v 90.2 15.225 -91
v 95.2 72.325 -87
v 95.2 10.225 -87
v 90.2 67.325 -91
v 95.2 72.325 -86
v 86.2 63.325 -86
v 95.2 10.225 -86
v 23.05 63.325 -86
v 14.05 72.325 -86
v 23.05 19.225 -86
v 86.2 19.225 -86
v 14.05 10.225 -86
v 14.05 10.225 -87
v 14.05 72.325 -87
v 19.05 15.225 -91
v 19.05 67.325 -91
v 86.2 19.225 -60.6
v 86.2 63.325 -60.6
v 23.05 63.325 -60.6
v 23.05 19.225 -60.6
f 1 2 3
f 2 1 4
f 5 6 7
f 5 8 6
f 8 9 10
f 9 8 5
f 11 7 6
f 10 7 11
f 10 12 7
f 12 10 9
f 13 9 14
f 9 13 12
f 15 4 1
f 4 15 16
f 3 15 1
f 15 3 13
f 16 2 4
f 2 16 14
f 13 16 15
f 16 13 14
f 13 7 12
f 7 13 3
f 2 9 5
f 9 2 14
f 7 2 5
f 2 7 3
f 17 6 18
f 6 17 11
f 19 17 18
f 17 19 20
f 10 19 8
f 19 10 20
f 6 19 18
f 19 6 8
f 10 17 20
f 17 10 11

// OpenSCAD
inches2mm = 25.4;

battery_height = 2.5*inches2mm;

battery_holder_width = 2.25*inches2mm;
battery_holder_depth = 1.5*inches2mm;
battery_holder_height = 1*inches2mm;
battery_fit_tol = 1;

battery_slider_extra_width = 5;
battery_slider_extra_depth = 5;
battery_slider_extra_height = 5;
battery_slider_gasket_thickness = 1.5;

battery_lip_width = 5;
battery_lip_pitch = 5;

battery_offset = 7;

battery_slider_pitch = 10;
battery_slider_width = 5;

mount_hole_diameter = 16.5;
mount_attachment_width = 1.5*inches2mm;
mount_attachment_height = 2.5*inches2mm;
mount_attachment_depth = 1/8*inches2mm;

bolt_diameter = 4.7;
hex_diameter = 8; // M4 nut
hex_thickness = 3; // M4 nut
//hex_diameter = 9.7; // #8 nut
//hex_thickness = 3.2; // #8 nut

post_diameter = 3/8*inches2mm;
post_hole_diameter = 3;
post_height = 3/8*inches2mm;
post_separation = 2*inches2mm;
post_offset = 1/2*inches2mm;

l_hole_diameter = post_hole_diameter+.7;
l_width = 2.5*inches2mm;
l_depth = 2*inches2mm;
l_height = 3.5*inches2mm;
l_offset = 4;
l_thickness = 5;

cover_height = 4*inches2mm;

holder_width = 3*inches2mm;
holder_depth = 2.5*inches2mm;
holder_height = 2*inches2mm;
thickness = 3;
base_thickness = 6;
lip_width = 3/8*inches2mm;
//lip_width = hex_diameter+1;
lip_pitch = 30;

wire_hole_diameter = 1/4*inches2mm;
power_hole_diameter = 1/4*inches2mm;

fit_tol = 1; // space between cover and holder when holder is inserted, adjust to get desired fit

separation = 10; // space between cover and holder, just for display purposes
battery_separation = 5;
battery_holder_separation = 1.5;
l_separation = 3;

square_off_width = lip_width-.1;
square_off_height = base_thickness;
square_off_z = lip_pitch;
$fs = .25;
$fa = .25;

//cover();
//holder();
//l_mount();
//battery_base();
battery_holder();
//battery_slider();

cover_width = holder_width+2*fit_tol+2*thickness;
cover_depth = holder_depth+2*fit_tol+2*thickness;

base_width = cover_width+2*thickness+2*lip_width;
base_depth = cover_depth+2*thickness+2*lip_width;

full_cover_height = cover_height+thickness;

bolt_height =  2*thickness+separation+battery_separation+2+lip_pitch;
bolt_z = -separation-2*thickness-battery_separation-1;


battery_width = battery_holder_width+2*thickness+2*battery_fit_tol;
battery_depth = battery_holder_depth+2*thickness+2*battery_fit_tol;    
battery_base_height = thickness+battery_height;

module cover() {
  difference() {
    union() {
      hull() {
        cube([base_width, base_depth, base_thickness]);
        translate([lip_width, lip_width, lip_pitch-thickness]) cube([base_width-2*lip_width, base_depth-2*lip_width, thickness]);

      }
      hull() {
          translate([base_width/2, base_depth-lip_width+mount_attachment_depth/2-1, cover_height-mount_attachment_height/2+thickness]) cube([mount_attachment_width, mount_attachment_depth, mount_attachment_height], center=true);
          translate([base_width/2, base_depth+10+mount_attachment_depth/2-1, cover_height-mount_attachment_height/2+thickness]) cylinder(r=mount_hole_diameter/2+thickness, h=mount_attachment_height, center=true);
          
      }
      translate([lip_width, lip_width, 0]) 
        cube([cover_width+2*thickness, cover_depth+2*thickness, cover_height+thickness]);
    }
    
    translate([lip_width+thickness,lip_width+thickness,-1]) 
      cube([cover_width, cover_depth, cover_height+1]); 
    hull() {
      translate([.75*lip_width+thickness,.75*lip_width+thickness,-thickness]) 
        cube([cover_width+.5*lip_width, cover_depth+.5*lip_width, thickness]); 
      translate([lip_width+thickness,lip_width+thickness,lip_pitch-thickness]) 
        cube([cover_width, cover_depth, thickness]);
    }
    bolts_and_hexes();
    wire_hole();
    power_hole();
    translate([base_width/2, base_depth+10+mount_attachment_depth/2-1, cover_height-mount_attachment_height/2]) cylinder(r=mount_hole_diameter/2, h=mount_attachment_height, center=true);
  }
}

module holder() {
difference() {
union() {
  difference() {
    union() {
        translate([0,0,-separation-thickness]) cube([base_width, base_depth, thickness]);
        translate([lip_width+thickness+fit_tol,lip_width+thickness+fit_tol,-separation-1]) 
          cube([cover_width-2*fit_tol, cover_depth-2*fit_tol, holder_height]);
    }
    translate([lip_width+thickness+fit_tol+thickness,lip_width+thickness+fit_tol+thickness,-separation]) 
          cube([cover_width-2*fit_tol-2*thickness, cover_depth-2*fit_tol-2*thickness, holder_height+1]);
    bolts_and_hexes();
    wire_hole();
    power_hole();
  }
  translate([base_width/2-post_separation/2,base_depth/2+post_offset,-separation-1]) cylinder(r=post_diameter/2, h=post_height+1);
    translate([base_width/2+post_separation/2,base_depth/2+post_offset,-separation-1]) cylinder(r=post_diameter/2, h=post_height+1);

}
  l_holes(post_hole_diameter);
}
}

module l_holes(d) {
      translate([base_width/2-post_separation/2,base_depth/2+post_offset,-separation]) cylinder(r=d/2, h=post_height+1+l_separation+l_thickness);
    translate([base_width/2+post_separation/2,base_depth/2+post_offset,-separation]) cylinder(r=d/2, h=post_height+1+l_separation+l_thickness);
}

module l_mount() {
    
    difference() {
      union() {
        translate([base_width/2, base_depth/2-l_offset, -separation+post_height+l_thickness/2+l_separation]) cube([l_width, l_depth, l_thickness], center=true); 
        //translate([
      }
      l_holes(l_hole_diameter);
    }
    
}

module bolts_and_hexes() {
    //bolts
    translate([lip_width/2,lip_width/2,bolt_z]) cylinder(r=bolt_diameter/2, h =bolt_height);
    translate([base_width-lip_width/2,lip_width/2,bolt_z]) cylinder(r=bolt_diameter/2, h = bolt_height);
    translate([base_width-lip_width/2,base_depth-lip_width/2,bolt_z]) cylinder(r=bolt_diameter/2, h = bolt_height);
    translate([lip_width/2,base_depth-lip_width/2,bolt_z]) cylinder(r=bolt_diameter/2, h = bolt_height);
    translate([base_width/2,lip_width/2,bolt_z]) cylinder(r=bolt_diameter/2, h = bolt_height);
    translate([base_width/2,base_depth-lip_width/2,bolt_z]) cylinder(r=bolt_diameter/2, h = bolt_height);
    translate([base_width-lip_width/2,base_depth/2,bolt_z]) cylinder(r=bolt_diameter/2, h = bolt_height);
    translate([lip_width/2,base_depth/2,bolt_z]) cylinder(r=bolt_diameter/2, h = bolt_height);
    
    // square off bolt holes on cover slant
    translate([lip_width/2,lip_width/2,square_off_height+square_off_z/2]) cube([square_off_width, square_off_width,square_off_z], center=true);
    translate([base_width-lip_width/2,lip_width/2,square_off_height+square_off_z/2]) cube([square_off_width,square_off_width,square_off_z], center=true);
    translate([base_width-lip_width/2,base_depth-lip_width/2,square_off_height+square_off_z/2]) cube([square_off_width,square_off_width,square_off_z], center=true);
    translate([lip_width/2,base_depth-lip_width/2,square_off_height+square_off_z/2]) cube([square_off_width,square_off_width,square_off_z], center=true);
    translate([base_width/2,lip_width/2,square_off_height+square_off_z/2]) cube([square_off_width,square_off_width,square_off_z], center=true);
    translate([base_width/2,base_depth-lip_width/2,square_off_height+square_off_z/2]) cube([square_off_width,square_off_width,square_off_z], center=true);
    translate([base_width-lip_width/2,base_depth/2,square_off_height+square_off_z/2]) cube([square_off_width,square_off_width,square_off_z], center=true);
    translate([lip_width/2,base_depth/2,square_off_height+square_off_z/2]) cube([square_off_width,square_off_width,square_off_z], center=true);
    
    // slots for inserted hex nuts
    translate([lip_width/2,lip_width/2,base_thickness-hex_thickness]) cylinder(r=hex_diameter/2, h = hex_thickness+1, $fn=6);
    translate([base_width-lip_width/2,lip_width/2,base_thickness-hex_thickness]) cylinder(r=hex_diameter/2, h = hex_thickness+1, $fn=6);
    translate([base_width-lip_width/2,base_depth-lip_width/2,base_thickness-hex_thickness]) cylinder(r=hex_diameter/2, h = hex_thickness+1, $fn=6);
    translate([lip_width/2,base_depth-lip_width/2,base_thickness-hex_thickness]) cylinder(r=hex_diameter/2, h = hex_thickness+1, $fn=6);
    translate([base_width/2,base_depth-lip_width/2,base_thickness-hex_thickness]) cylinder(r=hex_diameter/2, h = hex_thickness+1, $fn=6);
     translate([base_width/2,lip_width/2,base_thickness-hex_thickness]) cylinder(r=hex_diameter/2, h = hex_thickness+1, $fn=6);
     translate([lip_width/2,base_depth/2,base_thickness-hex_thickness]) cylinder(r=hex_diameter/2, h = hex_thickness+1, $fn=6);
    translate([base_width-lip_width/2,base_depth/2,base_thickness-hex_thickness]) cylinder(r=hex_diameter/2, h = hex_thickness+1, $fn=6);
}

module wire_hole() {
    translate([base_width/2,base_depth-(lip_width+thickness+wire_hole_diameter+fit_tol), -battery_separation-separation-2*thickness-1]) cylinder(r=wire_hole_diameter/2, h=2*thickness+separation+battery_separation+2);
}
module power_hole() {
    translate([base_width/2,base_depth/2, -battery_separation-separation-2*thickness-1]) cylinder(r=power_hole_diameter/2, h=2*thickness+separation+battery_separation+2);
}

module battery_base() {
    difference() {
      translate([0,0,-separation-battery_separation-thickness]) local_battery_base();
      bolts_and_hexes();
      wire_hole();
      power_hole();
    }
}

module local_battery_base() {
  difference() {
    union() {
      translate([base_width/2,base_depth/2-battery_offset,-thickness-battery_height/2]) cube([battery_width+2*thickness, battery_depth+2*thickness, battery_height], center=true);
        
      translate([0,0,-thickness]) cube([base_width, base_depth, thickness]);
      translate([0,-battery_offset, 0]) hull() {
          translate([base_width/2, base_depth/2, -thickness-battery_height-.5+battery_lip_pitch]) cube([battery_width+2*thickness, battery_depth+2*thickness, 1], center=true);
          translate([base_width/2, base_depth/2, -thickness-battery_height+.5]) cube([battery_width+2*battery_lip_width+2*thickness, battery_depth+2*battery_lip_width+2*thickness, 1], center=true);
      }
    }
    
    translate([base_width/2,base_depth/2-battery_offset,-thickness-battery_height/2-1]) cube([battery_width, battery_depth, battery_height+2], center=true);
   translate([0,-battery_offset, 0]) hull() {
          translate([base_width/2, base_depth/2, -thickness-battery_height-.5+battery_holder_height/2]) cube([battery_width, battery_depth, 1], center=true);
          translate([base_width/2, base_depth/2, -thickness-battery_height-.5]) cube([battery_width+battery_fit_tol+1, battery_depth+battery_fit_tol+1, 1], center=true);
      }
  }
}

module battery_holder() {
  translate([0,0,-separation-thickness-battery_separation-battery_base_height-battery_holder_separation]) local_battery_holder();
}

module local_battery_holder() {
    difference() {
    union() {
  translate([0,-battery_offset, 0]) hull() {
    translate([base_width/2, base_depth/2, -.5]) cube([battery_width+2*battery_lip_width+2*thickness, battery_depth+2*battery_lip_width+2*thickness, 1], center=true);
    
    translate([base_width/2, base_depth/2, .5-battery_lip_pitch]) cube([battery_width+2*thickness, battery_depth+2*thickness, 1], center=true);
    
  }
  translate([base_width/2, base_depth/2-battery_offset, battery_holder_height/2]) cube([battery_holder_width+2*thickness, battery_holder_depth+2*thickness, battery_holder_height], center=true);
  
  }
  
  }
}

module battery_slider() {
    translate([base_width/2,base_depth/2-battery_offset,-separation-thickness-battery_separation-battery_base_height-battery_holder_separation/2]) local_battery_slider();
}

slider_width = battery_width+2*thickness+2*battery_lip_width+battery_slider_extra_width;
slider_depth = battery_depth+2*thickness+2*battery_lip_width+battery_slider_extra_height;
slider_height = 2*battery_lip_pitch+battery_slider_gasket_thickness+battery_slider_extra_height;
module local_battery_slider() {
    difference() {
      cube([slider_width,slider_depth,slider_height],center = true);
      
      hull() {
        translate([0, 0, -.5+battery_slider_gasket_thickness/2+battery_lip_pitch]) cube([battery_width+2*thickness, battery_depth+2*thickness, 1], center=true);
        translate([0, 0, .5+battery_slider_gasket_thickness/2]) cube([battery_width+2*thickness+2*battery_lip_width, battery_depth+2*thickness+2*battery_lip_width, 1], center=true);
        translate([0, 0, -(.5+battery_slider_gasket_thickness/2)]) cube([battery_width+2*thickness+2*battery_lip_width, battery_depth+2*thickness+2*battery_lip_width, 1], center=true);
        translate([0, 0, -(-.5+battery_slider_gasket_thickness/2+battery_lip_pitch)]) cube([battery_width+2*thickness, battery_depth+2*thickness, 1], center=true);
      }
      cube([battery_width+2*thickness, battery_depth+2*thickness, slider_height+2], center=true);
      translate([0,battery_depth/2+thickness+(battery_lip_width+battery_slider_extra_depth/2)/2,0]) cube([battery_width+2*thickness, battery_lip_width+battery_slider_extra_depth/2+2, slider_height+2], center=true);

      
    }
}
